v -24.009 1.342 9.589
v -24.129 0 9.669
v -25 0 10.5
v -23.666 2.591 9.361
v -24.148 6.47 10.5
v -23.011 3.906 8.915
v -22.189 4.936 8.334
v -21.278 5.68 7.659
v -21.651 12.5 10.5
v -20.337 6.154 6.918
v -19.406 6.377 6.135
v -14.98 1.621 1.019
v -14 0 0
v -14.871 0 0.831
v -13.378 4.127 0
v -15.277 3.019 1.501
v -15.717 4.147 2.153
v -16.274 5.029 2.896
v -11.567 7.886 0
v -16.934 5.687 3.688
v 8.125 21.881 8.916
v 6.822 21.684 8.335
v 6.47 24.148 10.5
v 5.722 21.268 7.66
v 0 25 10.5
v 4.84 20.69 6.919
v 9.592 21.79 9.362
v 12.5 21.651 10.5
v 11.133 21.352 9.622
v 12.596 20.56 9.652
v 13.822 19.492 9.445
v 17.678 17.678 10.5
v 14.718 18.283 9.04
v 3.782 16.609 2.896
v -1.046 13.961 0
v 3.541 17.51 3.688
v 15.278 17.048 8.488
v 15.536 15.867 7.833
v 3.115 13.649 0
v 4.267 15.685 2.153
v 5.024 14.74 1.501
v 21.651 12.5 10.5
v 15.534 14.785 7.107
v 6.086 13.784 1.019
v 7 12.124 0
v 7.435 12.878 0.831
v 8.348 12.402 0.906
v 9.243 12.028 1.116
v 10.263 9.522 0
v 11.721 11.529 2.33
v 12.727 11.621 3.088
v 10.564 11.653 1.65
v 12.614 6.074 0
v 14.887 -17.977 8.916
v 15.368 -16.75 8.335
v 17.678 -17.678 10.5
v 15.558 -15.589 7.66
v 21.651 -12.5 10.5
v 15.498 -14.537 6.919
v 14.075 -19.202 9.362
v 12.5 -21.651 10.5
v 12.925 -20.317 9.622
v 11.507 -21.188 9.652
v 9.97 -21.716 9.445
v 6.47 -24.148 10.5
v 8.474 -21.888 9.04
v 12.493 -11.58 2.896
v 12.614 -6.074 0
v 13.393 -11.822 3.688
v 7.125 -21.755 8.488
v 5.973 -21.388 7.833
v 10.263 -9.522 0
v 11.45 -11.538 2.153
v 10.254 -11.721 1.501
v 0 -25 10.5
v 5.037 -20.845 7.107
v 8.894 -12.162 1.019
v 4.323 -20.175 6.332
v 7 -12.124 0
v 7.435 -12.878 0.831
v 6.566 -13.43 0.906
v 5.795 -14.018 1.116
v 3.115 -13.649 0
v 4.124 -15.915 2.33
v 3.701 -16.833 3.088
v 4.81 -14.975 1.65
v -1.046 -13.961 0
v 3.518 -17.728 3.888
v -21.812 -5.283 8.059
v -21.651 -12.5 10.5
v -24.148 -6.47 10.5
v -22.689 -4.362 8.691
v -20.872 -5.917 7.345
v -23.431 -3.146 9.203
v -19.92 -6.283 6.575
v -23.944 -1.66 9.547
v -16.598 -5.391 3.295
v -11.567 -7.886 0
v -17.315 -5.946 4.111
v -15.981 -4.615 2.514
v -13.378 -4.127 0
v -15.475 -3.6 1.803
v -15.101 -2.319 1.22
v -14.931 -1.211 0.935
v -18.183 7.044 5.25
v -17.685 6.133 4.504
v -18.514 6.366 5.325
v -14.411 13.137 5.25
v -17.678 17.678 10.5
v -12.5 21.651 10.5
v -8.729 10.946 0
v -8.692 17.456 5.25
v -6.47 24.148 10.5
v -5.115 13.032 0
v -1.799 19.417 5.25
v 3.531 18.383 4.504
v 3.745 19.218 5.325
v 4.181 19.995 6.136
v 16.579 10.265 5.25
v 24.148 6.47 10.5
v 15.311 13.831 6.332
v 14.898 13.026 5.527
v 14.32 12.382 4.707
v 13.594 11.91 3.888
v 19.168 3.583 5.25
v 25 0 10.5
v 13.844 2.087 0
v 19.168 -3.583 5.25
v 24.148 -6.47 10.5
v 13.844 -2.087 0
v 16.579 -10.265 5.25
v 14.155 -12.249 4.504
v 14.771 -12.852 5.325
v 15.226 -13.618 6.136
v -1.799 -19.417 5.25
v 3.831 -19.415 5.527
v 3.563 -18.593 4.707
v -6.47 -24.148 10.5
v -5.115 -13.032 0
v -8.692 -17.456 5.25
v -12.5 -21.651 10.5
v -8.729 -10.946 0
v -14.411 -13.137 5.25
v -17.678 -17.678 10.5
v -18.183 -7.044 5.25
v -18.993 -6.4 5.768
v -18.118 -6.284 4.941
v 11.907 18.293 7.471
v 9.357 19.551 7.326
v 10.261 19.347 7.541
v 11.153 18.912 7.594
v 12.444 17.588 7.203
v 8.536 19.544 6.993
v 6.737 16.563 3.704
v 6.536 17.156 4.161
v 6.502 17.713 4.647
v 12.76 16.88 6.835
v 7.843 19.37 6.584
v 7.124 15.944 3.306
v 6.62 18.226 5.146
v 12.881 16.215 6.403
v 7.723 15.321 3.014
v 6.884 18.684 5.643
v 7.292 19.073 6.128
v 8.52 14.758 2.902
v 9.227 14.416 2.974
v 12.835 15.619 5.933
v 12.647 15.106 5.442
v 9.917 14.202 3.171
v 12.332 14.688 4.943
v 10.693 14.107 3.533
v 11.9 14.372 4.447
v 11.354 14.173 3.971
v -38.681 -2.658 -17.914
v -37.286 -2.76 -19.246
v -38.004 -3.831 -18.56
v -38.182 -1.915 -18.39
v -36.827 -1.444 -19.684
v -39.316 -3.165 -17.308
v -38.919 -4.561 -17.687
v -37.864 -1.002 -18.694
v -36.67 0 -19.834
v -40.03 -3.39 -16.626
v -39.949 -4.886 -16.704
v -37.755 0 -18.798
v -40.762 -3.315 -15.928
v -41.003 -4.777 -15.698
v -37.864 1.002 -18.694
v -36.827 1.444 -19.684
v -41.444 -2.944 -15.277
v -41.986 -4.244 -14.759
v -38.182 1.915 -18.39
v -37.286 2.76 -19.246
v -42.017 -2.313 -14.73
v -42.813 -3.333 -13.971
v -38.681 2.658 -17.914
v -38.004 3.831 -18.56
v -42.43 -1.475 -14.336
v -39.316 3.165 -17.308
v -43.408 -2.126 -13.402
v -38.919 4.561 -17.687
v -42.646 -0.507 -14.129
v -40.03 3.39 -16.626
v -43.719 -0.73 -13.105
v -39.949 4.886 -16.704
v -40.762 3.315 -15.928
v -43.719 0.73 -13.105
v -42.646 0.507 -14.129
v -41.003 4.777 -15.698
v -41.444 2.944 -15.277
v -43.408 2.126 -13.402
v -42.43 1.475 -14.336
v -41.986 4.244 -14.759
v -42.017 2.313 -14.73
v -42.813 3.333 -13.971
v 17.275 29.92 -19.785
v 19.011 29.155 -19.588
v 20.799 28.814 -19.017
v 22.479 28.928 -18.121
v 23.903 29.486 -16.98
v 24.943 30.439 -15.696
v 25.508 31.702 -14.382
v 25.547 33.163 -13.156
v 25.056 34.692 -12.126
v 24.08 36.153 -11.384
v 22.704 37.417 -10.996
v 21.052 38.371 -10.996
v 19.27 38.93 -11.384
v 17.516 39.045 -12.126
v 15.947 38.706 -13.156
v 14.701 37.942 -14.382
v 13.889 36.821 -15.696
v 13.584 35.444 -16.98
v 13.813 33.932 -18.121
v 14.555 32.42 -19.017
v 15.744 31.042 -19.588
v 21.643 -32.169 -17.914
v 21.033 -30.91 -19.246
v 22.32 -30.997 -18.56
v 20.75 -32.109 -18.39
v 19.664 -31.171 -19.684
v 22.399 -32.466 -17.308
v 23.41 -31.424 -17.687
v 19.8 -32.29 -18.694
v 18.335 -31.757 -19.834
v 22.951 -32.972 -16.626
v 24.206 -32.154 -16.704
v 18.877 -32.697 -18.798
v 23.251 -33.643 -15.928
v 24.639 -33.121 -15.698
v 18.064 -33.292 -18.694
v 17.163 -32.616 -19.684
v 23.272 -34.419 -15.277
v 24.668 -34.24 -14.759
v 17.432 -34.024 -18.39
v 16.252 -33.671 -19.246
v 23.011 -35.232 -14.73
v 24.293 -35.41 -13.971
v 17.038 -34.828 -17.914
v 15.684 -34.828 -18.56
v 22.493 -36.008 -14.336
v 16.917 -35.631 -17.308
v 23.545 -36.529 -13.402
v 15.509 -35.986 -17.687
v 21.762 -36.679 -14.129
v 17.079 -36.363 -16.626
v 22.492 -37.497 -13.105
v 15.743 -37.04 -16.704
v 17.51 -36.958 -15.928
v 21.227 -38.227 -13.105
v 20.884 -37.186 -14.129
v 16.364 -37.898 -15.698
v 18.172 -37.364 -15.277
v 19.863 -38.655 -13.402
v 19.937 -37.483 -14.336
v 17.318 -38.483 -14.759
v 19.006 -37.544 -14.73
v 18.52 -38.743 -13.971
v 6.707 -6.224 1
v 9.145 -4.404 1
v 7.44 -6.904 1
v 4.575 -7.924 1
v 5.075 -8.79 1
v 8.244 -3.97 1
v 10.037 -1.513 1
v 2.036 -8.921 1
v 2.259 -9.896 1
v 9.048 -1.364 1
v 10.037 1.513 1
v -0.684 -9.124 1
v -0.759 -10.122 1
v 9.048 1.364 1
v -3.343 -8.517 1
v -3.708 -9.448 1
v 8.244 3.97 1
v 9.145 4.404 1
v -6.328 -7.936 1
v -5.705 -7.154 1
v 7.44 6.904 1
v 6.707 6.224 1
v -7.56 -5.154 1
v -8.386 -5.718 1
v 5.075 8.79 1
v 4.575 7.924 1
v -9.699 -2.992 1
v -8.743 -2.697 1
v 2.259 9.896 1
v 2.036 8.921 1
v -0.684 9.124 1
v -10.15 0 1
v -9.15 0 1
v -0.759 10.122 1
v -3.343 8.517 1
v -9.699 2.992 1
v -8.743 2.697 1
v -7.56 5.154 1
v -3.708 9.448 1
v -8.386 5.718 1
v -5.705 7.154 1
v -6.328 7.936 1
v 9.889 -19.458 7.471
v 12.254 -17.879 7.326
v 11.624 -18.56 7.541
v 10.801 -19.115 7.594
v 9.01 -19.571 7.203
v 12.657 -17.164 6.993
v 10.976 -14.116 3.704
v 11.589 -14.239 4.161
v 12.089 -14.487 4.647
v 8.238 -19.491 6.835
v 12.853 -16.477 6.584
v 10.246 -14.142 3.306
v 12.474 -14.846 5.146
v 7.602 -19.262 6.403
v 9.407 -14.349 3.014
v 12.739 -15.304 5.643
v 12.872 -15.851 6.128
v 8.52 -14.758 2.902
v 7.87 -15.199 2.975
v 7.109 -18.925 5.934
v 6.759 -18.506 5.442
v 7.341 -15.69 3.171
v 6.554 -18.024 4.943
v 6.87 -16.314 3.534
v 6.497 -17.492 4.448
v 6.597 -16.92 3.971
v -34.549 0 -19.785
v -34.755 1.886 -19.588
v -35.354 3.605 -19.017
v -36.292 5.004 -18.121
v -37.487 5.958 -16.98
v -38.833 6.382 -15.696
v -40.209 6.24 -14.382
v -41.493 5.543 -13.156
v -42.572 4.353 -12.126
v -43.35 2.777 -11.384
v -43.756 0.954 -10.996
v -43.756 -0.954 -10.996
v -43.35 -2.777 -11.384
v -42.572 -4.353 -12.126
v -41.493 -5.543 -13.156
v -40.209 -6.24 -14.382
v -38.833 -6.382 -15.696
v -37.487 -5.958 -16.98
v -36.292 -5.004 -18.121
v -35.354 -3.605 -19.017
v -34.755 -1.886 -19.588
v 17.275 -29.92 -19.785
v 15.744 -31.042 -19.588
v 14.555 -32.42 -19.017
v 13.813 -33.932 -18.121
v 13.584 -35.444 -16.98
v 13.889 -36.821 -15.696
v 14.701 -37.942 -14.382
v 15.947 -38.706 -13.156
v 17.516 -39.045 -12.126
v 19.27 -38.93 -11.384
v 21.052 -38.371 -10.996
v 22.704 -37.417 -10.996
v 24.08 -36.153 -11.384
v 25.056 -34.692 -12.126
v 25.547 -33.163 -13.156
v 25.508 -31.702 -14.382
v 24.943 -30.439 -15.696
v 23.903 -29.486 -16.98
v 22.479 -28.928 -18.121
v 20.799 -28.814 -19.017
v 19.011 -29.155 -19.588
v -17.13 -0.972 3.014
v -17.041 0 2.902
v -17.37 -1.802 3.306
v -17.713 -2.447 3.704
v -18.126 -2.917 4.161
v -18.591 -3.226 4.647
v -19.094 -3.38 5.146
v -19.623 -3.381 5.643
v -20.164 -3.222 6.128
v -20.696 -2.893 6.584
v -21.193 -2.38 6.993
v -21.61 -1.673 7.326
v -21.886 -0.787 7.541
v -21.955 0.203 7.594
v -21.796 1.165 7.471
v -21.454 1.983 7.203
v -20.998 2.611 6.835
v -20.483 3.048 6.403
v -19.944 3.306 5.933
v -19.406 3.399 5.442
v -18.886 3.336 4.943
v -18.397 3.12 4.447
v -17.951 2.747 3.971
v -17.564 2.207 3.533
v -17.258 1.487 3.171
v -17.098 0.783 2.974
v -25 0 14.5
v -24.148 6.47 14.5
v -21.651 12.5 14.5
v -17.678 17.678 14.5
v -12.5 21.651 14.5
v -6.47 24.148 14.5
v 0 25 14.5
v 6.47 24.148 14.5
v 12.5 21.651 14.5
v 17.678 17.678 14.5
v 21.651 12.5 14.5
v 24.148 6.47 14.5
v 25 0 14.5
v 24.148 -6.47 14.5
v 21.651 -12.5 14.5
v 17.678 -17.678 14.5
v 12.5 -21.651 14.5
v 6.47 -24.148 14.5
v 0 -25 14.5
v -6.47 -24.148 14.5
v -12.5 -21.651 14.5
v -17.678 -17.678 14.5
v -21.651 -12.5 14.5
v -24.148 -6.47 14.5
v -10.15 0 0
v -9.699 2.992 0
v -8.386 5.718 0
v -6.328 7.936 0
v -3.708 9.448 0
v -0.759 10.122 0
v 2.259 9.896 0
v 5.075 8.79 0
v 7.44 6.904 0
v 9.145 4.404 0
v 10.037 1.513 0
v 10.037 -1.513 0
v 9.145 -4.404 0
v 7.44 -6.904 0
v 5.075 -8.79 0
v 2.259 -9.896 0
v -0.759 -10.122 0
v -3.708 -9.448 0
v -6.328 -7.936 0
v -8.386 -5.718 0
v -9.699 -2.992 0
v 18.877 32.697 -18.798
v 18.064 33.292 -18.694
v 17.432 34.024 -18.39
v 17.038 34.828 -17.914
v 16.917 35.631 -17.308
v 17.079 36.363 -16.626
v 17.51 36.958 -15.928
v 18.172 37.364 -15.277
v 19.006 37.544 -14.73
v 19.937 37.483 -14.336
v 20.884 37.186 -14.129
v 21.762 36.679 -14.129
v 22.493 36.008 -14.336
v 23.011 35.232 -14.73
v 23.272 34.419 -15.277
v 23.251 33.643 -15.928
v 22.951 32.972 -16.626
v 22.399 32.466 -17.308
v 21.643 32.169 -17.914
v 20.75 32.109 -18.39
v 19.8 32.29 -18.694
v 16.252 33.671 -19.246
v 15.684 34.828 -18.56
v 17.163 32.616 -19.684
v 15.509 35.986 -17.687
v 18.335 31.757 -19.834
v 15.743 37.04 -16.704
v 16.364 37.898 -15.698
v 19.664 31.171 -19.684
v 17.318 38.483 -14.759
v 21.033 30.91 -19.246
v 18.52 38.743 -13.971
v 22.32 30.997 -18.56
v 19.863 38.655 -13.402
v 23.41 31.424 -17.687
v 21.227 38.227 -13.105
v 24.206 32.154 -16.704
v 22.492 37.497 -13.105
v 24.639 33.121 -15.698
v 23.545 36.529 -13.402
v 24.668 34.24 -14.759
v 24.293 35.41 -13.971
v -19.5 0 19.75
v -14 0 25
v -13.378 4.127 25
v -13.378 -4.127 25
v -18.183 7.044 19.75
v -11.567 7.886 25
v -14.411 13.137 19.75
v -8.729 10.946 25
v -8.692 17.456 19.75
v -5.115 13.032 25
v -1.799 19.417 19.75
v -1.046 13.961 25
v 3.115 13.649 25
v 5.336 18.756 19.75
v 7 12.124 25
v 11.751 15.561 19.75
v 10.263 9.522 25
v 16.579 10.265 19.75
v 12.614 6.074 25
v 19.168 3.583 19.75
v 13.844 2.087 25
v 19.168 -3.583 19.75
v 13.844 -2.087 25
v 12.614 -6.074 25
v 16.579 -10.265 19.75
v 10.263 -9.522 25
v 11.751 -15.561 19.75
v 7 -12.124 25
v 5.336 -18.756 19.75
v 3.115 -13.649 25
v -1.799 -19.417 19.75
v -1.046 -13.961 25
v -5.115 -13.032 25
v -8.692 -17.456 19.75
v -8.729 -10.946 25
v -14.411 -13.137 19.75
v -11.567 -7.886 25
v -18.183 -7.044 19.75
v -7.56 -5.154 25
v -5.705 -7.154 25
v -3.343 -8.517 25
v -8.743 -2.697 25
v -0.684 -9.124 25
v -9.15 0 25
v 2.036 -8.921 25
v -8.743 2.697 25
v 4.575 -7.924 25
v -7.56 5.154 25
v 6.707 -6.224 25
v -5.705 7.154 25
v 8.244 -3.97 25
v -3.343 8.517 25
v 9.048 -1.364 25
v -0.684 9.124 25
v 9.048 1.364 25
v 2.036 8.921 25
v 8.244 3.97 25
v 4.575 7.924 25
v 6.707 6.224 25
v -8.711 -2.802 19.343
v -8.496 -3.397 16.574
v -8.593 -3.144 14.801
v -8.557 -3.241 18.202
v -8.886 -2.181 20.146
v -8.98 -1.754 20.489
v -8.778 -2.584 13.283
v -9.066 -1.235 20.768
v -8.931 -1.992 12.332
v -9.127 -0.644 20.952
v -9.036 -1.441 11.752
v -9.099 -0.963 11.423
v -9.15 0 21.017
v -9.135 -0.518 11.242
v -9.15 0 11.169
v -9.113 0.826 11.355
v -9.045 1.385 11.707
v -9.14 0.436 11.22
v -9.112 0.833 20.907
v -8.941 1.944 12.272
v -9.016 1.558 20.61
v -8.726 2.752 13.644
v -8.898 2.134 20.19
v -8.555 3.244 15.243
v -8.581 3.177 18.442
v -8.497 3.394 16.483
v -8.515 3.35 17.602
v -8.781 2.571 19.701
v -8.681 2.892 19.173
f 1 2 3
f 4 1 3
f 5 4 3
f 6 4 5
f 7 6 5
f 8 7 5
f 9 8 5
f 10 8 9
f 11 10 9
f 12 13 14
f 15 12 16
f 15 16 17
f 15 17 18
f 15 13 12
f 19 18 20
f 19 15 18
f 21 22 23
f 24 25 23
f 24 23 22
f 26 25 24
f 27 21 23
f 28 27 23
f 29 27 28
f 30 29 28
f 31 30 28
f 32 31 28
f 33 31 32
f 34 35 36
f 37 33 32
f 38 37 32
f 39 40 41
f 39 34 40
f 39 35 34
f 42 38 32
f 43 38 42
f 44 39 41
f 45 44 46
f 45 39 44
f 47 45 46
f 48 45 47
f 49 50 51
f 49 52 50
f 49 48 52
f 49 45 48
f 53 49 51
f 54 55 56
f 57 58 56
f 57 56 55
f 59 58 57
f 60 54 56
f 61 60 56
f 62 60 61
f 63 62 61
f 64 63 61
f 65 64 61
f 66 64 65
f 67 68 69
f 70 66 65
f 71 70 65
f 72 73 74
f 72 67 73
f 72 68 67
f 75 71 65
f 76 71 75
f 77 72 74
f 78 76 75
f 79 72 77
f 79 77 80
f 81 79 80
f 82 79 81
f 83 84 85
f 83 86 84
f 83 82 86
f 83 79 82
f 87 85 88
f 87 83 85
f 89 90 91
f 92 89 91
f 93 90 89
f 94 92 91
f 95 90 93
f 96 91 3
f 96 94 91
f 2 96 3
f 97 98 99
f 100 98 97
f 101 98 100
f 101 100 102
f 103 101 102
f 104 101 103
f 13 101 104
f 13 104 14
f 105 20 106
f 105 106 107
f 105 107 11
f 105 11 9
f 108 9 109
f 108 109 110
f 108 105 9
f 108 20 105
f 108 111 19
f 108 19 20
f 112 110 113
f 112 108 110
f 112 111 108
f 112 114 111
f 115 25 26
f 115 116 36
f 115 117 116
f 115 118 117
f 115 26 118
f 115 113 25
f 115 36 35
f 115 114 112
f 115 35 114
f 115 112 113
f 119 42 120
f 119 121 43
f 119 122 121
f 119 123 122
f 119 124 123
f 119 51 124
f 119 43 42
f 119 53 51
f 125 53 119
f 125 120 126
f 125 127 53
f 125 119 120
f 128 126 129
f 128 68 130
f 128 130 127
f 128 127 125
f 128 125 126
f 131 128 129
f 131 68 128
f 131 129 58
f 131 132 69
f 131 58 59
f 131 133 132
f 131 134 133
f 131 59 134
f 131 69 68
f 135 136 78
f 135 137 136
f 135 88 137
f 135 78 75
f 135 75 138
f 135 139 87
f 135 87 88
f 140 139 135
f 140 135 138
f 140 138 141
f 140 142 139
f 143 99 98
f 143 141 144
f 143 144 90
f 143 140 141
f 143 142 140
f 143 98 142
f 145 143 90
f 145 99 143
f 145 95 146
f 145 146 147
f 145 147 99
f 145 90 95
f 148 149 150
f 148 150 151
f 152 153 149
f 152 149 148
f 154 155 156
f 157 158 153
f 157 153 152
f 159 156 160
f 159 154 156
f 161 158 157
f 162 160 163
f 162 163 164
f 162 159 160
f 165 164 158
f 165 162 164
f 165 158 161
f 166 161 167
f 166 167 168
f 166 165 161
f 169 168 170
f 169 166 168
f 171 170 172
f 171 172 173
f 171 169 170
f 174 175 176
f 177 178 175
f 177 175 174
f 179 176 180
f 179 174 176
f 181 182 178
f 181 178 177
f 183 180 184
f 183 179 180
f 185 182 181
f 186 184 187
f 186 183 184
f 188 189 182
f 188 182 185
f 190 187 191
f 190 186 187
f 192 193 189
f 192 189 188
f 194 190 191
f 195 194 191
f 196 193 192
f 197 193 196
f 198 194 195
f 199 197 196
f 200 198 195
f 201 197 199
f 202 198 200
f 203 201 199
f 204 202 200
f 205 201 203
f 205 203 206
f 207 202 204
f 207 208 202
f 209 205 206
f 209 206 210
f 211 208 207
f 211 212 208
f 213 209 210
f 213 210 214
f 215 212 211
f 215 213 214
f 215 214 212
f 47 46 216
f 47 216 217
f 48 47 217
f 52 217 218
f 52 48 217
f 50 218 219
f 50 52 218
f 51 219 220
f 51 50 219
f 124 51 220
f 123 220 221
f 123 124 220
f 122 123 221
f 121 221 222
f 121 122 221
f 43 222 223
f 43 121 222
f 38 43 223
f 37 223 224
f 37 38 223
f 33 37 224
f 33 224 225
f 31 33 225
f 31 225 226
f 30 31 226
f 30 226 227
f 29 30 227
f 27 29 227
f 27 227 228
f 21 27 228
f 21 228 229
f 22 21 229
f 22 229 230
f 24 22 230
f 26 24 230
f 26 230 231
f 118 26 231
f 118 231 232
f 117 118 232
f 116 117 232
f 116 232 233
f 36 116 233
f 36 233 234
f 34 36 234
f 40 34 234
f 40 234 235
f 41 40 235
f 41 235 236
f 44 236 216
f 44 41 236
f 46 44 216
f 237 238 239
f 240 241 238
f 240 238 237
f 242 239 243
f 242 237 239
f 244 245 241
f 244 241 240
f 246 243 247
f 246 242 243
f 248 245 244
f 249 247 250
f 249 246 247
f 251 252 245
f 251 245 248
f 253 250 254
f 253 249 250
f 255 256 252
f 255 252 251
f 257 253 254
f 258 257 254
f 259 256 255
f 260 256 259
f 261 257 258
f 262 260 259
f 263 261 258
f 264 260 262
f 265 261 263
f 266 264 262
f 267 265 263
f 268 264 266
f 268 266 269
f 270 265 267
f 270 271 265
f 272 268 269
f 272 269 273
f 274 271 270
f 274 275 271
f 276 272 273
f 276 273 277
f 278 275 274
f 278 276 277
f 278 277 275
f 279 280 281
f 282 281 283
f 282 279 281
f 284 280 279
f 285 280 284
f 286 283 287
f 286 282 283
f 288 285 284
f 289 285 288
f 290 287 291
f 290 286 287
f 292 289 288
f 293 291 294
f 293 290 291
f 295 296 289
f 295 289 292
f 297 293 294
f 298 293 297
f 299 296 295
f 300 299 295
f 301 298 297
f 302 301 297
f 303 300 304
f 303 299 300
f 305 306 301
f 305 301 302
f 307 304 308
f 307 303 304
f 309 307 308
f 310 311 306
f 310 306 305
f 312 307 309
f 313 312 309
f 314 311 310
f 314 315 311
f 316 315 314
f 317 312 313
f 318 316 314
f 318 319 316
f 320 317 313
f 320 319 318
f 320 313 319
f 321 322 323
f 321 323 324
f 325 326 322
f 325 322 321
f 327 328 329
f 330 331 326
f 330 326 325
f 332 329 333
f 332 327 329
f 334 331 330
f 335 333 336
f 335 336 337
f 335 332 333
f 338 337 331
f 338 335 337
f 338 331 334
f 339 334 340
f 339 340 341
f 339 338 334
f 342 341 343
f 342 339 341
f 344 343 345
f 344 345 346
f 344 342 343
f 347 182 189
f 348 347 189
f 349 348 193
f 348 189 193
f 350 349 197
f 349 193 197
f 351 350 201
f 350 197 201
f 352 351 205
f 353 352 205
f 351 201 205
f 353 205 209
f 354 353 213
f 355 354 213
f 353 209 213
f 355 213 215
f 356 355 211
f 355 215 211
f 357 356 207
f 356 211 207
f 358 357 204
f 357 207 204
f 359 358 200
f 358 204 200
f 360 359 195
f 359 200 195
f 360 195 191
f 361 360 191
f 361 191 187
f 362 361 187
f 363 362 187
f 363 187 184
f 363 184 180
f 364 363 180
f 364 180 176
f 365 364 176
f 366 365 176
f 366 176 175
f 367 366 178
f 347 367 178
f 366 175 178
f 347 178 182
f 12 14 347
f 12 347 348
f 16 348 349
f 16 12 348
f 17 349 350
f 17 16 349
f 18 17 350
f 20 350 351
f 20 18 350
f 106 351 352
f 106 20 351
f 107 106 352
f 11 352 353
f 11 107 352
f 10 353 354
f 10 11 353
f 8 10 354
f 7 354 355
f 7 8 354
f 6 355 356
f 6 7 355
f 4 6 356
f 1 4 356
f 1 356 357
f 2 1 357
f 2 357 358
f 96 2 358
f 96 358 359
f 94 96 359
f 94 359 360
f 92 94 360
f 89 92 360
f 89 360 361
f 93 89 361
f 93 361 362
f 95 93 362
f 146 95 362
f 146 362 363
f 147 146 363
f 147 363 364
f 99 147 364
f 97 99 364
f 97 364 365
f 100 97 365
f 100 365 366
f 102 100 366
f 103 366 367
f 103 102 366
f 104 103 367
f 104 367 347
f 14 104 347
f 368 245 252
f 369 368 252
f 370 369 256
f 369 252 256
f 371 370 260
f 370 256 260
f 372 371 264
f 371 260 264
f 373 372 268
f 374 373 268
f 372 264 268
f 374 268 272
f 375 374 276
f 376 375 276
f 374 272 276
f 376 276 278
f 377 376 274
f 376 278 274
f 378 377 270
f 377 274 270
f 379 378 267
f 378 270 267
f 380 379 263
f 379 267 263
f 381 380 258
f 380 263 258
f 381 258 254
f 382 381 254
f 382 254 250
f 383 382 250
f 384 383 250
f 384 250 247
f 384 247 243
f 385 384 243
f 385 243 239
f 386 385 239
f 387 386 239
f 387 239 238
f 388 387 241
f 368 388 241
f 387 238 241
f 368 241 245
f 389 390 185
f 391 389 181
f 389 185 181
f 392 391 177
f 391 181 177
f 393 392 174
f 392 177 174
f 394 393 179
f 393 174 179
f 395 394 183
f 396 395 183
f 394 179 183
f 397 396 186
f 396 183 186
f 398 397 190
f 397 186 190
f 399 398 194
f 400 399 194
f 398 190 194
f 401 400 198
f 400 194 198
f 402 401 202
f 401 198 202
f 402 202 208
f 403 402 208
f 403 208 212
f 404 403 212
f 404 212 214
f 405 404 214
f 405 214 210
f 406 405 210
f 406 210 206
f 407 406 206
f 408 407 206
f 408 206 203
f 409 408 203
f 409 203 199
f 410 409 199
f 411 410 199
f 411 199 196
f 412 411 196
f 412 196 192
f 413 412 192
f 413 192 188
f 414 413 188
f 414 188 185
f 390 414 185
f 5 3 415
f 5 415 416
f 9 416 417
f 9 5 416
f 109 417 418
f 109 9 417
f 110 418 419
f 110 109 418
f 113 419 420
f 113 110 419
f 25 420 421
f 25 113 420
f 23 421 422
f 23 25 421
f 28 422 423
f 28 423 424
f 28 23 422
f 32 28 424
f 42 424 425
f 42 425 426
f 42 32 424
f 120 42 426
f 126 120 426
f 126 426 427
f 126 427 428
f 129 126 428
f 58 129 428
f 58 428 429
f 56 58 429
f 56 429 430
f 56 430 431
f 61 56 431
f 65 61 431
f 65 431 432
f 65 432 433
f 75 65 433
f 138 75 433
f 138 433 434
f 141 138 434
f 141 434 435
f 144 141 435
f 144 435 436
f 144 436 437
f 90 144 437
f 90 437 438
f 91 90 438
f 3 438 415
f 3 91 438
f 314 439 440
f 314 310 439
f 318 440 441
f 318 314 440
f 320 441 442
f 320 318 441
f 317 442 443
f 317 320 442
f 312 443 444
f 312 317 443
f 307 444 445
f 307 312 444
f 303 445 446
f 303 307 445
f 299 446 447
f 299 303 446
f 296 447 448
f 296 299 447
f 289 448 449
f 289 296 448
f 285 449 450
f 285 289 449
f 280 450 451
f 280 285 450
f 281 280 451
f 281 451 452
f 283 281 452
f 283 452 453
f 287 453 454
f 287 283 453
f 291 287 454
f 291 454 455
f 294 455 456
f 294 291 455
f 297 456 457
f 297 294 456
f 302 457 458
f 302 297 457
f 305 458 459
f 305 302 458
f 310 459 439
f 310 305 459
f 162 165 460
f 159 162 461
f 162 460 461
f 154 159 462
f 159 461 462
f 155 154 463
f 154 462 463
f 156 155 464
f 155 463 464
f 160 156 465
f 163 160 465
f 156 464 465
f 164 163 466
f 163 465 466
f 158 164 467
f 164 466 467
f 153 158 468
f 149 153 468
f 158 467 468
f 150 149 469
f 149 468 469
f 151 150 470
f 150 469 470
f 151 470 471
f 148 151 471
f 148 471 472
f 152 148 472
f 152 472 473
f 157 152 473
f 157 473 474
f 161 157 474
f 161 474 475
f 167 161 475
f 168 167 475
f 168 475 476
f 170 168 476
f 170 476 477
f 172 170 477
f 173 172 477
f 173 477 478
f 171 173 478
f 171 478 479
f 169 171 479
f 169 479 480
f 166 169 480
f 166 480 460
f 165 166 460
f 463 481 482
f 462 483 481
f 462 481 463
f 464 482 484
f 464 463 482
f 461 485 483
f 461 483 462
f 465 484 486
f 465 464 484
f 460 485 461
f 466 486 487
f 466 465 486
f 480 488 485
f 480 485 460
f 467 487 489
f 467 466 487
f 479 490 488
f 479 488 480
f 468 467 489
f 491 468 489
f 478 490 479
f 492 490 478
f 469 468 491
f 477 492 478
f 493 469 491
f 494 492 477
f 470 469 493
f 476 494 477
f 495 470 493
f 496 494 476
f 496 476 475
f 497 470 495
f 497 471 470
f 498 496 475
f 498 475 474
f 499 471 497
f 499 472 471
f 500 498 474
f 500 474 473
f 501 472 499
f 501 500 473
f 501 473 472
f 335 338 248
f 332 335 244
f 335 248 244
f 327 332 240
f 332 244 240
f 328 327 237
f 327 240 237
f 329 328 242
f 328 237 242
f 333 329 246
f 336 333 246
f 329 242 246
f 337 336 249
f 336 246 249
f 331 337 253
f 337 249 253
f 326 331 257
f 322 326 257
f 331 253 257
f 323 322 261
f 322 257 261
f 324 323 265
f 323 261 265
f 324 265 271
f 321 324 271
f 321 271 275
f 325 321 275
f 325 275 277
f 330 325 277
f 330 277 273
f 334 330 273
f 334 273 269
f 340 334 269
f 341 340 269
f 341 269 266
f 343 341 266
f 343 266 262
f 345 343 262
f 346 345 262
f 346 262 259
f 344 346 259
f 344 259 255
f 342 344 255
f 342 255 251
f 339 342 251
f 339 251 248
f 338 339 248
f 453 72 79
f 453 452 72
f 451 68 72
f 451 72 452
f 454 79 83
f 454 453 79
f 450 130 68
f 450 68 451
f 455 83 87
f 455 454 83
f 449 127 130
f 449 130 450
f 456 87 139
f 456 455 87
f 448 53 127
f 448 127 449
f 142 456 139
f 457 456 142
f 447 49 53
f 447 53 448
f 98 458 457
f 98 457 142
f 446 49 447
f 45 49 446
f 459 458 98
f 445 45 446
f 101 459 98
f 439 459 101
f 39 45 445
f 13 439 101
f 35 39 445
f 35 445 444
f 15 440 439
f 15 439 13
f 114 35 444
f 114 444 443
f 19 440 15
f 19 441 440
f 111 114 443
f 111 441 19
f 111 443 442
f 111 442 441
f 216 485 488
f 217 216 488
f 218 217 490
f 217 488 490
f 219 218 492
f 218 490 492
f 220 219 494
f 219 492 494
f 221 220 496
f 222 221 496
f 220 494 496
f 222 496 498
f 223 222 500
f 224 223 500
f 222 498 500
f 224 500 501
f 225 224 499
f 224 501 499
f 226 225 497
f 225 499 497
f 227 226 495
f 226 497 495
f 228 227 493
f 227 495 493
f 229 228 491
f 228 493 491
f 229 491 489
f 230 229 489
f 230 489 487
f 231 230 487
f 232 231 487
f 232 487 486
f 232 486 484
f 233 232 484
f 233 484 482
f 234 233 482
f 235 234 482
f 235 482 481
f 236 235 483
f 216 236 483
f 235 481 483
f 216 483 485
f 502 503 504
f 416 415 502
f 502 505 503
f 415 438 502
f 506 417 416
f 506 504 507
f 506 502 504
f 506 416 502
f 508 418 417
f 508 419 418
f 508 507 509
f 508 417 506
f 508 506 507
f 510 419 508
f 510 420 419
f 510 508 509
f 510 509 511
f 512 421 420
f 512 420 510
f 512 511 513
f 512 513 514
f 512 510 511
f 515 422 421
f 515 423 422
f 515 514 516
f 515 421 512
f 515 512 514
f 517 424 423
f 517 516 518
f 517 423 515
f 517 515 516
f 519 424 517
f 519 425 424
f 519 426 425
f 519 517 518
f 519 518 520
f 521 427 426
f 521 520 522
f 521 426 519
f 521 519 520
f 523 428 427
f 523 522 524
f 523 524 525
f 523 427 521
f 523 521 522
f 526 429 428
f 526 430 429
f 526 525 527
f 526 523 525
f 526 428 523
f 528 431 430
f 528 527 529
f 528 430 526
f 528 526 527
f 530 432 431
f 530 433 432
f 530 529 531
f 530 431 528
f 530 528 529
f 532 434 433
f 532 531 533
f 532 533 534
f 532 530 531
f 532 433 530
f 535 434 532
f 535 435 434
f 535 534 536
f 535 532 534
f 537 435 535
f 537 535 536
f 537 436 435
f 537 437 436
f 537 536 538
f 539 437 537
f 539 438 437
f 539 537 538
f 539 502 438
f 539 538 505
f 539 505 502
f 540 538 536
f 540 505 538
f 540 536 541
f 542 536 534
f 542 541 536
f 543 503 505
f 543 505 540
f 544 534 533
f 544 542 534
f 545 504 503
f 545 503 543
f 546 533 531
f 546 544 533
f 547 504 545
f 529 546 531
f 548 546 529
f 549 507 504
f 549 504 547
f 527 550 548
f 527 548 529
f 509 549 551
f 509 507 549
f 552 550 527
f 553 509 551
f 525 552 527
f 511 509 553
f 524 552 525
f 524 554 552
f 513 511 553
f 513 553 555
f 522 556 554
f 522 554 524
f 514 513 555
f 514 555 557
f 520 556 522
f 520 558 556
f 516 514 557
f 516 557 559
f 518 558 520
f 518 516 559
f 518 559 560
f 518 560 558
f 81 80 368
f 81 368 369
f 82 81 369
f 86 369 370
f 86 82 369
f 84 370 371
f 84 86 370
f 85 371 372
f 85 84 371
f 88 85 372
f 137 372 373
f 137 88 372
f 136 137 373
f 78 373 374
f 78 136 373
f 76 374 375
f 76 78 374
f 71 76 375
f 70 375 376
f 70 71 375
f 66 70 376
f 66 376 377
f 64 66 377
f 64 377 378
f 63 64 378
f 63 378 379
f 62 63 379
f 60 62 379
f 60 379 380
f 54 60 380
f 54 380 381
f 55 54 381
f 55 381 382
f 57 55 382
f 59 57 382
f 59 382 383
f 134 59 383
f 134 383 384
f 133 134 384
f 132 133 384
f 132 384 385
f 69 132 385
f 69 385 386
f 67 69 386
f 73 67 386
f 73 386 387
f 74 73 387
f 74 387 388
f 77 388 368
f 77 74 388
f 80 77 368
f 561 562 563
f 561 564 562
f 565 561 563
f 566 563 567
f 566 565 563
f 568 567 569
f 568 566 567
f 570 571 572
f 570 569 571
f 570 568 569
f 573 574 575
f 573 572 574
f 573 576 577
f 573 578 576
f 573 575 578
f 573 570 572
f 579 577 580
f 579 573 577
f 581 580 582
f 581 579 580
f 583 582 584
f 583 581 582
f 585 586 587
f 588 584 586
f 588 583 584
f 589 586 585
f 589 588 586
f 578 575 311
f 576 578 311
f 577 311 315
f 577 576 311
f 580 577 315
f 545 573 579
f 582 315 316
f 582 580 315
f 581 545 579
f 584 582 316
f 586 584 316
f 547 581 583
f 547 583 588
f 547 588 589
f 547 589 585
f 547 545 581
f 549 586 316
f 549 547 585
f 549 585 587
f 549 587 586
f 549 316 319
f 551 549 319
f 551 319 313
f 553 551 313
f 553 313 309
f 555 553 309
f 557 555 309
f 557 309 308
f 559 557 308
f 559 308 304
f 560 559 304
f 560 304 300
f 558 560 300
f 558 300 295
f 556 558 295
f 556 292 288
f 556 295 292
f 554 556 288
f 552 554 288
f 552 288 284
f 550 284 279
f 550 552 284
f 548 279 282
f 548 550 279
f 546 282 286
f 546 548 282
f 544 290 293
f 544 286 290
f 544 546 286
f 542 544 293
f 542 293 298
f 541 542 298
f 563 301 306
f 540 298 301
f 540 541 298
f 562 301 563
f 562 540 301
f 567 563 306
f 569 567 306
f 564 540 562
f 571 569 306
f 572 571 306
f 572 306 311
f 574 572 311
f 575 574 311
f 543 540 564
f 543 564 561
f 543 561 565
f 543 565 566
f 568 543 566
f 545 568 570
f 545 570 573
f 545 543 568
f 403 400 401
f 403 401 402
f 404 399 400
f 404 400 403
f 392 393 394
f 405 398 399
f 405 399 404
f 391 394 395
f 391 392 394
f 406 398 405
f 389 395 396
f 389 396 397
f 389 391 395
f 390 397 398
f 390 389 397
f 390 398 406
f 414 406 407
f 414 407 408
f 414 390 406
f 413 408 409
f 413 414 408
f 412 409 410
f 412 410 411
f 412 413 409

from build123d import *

# Parameters (mm, degrees)
F4_R     = 3.4
F5_DEPTH = 75.0134427933
F6_SIZE  = 1.5
F7_COUNT = 3


with BuildPart() as f1:
    # F0 (on Front) → F1 (revolve)
    with BuildSketch(Plane.XZ):
        Polygon((-9.15, 1), (-9.15, 25), (-14, 25), (-25, 14.5), (-25, 10.5), (-14, 0), (-10.15, 0), (-10.15, 1), align=None)
    revolve(axis=Axis((0, 0, 12.5), (0, 0, -1)))

    # F2 (on Front) → F3 (revolve)
    with BuildSketch(Plane.XZ):
        Polygon((-35.584796918, -20.8697111031), (-14.8705245175, 0.8309552212), (-10.4189875067, 5.4944701849), (-15.0484629892, 9.9135149637), (-19.5, 5.25), (-40.2142724005, -16.4506663243), align=None)
    revolve(axis=Axis((-29.8571362002, 0, -5.6003331622), (0.6904757467, 0, 0.7233555441)))

    # F4 (on face) → F5 (cut, through all)
    with BuildSketch(Plane(origin=(-27.3888669951, 0, -28.6930987567), x_dir=(0.7233555441, 0, -0.6904757467), z_dir=(-0.6904757467, 0, -0.7233555441))):
        with Locations((-17.7304307809, 0)):
            Circle(F4_R)
    extrude(amount=-F5_DEPTH, mode=Mode.SUBTRACT)

    # F6
    f6_edges = [f1.edges().sort_by_distance(p)[0] for p in [
        (-44.843748, 0, -12.031622),
    ]]
    chamfer(f6_edges, length=F6_SIZE)

    # F7: F1 ×3 about axis
    f7_axis = Axis((0, 0, 14.5), (0, 0, -1))


with BuildPart() as f1_1:
    add(f1.part)
    for i in range(1, F7_COUNT):
        add(f1.part.rotate(f7_axis, i * 360 / F7_COUNT))


solid = f1_1.part
